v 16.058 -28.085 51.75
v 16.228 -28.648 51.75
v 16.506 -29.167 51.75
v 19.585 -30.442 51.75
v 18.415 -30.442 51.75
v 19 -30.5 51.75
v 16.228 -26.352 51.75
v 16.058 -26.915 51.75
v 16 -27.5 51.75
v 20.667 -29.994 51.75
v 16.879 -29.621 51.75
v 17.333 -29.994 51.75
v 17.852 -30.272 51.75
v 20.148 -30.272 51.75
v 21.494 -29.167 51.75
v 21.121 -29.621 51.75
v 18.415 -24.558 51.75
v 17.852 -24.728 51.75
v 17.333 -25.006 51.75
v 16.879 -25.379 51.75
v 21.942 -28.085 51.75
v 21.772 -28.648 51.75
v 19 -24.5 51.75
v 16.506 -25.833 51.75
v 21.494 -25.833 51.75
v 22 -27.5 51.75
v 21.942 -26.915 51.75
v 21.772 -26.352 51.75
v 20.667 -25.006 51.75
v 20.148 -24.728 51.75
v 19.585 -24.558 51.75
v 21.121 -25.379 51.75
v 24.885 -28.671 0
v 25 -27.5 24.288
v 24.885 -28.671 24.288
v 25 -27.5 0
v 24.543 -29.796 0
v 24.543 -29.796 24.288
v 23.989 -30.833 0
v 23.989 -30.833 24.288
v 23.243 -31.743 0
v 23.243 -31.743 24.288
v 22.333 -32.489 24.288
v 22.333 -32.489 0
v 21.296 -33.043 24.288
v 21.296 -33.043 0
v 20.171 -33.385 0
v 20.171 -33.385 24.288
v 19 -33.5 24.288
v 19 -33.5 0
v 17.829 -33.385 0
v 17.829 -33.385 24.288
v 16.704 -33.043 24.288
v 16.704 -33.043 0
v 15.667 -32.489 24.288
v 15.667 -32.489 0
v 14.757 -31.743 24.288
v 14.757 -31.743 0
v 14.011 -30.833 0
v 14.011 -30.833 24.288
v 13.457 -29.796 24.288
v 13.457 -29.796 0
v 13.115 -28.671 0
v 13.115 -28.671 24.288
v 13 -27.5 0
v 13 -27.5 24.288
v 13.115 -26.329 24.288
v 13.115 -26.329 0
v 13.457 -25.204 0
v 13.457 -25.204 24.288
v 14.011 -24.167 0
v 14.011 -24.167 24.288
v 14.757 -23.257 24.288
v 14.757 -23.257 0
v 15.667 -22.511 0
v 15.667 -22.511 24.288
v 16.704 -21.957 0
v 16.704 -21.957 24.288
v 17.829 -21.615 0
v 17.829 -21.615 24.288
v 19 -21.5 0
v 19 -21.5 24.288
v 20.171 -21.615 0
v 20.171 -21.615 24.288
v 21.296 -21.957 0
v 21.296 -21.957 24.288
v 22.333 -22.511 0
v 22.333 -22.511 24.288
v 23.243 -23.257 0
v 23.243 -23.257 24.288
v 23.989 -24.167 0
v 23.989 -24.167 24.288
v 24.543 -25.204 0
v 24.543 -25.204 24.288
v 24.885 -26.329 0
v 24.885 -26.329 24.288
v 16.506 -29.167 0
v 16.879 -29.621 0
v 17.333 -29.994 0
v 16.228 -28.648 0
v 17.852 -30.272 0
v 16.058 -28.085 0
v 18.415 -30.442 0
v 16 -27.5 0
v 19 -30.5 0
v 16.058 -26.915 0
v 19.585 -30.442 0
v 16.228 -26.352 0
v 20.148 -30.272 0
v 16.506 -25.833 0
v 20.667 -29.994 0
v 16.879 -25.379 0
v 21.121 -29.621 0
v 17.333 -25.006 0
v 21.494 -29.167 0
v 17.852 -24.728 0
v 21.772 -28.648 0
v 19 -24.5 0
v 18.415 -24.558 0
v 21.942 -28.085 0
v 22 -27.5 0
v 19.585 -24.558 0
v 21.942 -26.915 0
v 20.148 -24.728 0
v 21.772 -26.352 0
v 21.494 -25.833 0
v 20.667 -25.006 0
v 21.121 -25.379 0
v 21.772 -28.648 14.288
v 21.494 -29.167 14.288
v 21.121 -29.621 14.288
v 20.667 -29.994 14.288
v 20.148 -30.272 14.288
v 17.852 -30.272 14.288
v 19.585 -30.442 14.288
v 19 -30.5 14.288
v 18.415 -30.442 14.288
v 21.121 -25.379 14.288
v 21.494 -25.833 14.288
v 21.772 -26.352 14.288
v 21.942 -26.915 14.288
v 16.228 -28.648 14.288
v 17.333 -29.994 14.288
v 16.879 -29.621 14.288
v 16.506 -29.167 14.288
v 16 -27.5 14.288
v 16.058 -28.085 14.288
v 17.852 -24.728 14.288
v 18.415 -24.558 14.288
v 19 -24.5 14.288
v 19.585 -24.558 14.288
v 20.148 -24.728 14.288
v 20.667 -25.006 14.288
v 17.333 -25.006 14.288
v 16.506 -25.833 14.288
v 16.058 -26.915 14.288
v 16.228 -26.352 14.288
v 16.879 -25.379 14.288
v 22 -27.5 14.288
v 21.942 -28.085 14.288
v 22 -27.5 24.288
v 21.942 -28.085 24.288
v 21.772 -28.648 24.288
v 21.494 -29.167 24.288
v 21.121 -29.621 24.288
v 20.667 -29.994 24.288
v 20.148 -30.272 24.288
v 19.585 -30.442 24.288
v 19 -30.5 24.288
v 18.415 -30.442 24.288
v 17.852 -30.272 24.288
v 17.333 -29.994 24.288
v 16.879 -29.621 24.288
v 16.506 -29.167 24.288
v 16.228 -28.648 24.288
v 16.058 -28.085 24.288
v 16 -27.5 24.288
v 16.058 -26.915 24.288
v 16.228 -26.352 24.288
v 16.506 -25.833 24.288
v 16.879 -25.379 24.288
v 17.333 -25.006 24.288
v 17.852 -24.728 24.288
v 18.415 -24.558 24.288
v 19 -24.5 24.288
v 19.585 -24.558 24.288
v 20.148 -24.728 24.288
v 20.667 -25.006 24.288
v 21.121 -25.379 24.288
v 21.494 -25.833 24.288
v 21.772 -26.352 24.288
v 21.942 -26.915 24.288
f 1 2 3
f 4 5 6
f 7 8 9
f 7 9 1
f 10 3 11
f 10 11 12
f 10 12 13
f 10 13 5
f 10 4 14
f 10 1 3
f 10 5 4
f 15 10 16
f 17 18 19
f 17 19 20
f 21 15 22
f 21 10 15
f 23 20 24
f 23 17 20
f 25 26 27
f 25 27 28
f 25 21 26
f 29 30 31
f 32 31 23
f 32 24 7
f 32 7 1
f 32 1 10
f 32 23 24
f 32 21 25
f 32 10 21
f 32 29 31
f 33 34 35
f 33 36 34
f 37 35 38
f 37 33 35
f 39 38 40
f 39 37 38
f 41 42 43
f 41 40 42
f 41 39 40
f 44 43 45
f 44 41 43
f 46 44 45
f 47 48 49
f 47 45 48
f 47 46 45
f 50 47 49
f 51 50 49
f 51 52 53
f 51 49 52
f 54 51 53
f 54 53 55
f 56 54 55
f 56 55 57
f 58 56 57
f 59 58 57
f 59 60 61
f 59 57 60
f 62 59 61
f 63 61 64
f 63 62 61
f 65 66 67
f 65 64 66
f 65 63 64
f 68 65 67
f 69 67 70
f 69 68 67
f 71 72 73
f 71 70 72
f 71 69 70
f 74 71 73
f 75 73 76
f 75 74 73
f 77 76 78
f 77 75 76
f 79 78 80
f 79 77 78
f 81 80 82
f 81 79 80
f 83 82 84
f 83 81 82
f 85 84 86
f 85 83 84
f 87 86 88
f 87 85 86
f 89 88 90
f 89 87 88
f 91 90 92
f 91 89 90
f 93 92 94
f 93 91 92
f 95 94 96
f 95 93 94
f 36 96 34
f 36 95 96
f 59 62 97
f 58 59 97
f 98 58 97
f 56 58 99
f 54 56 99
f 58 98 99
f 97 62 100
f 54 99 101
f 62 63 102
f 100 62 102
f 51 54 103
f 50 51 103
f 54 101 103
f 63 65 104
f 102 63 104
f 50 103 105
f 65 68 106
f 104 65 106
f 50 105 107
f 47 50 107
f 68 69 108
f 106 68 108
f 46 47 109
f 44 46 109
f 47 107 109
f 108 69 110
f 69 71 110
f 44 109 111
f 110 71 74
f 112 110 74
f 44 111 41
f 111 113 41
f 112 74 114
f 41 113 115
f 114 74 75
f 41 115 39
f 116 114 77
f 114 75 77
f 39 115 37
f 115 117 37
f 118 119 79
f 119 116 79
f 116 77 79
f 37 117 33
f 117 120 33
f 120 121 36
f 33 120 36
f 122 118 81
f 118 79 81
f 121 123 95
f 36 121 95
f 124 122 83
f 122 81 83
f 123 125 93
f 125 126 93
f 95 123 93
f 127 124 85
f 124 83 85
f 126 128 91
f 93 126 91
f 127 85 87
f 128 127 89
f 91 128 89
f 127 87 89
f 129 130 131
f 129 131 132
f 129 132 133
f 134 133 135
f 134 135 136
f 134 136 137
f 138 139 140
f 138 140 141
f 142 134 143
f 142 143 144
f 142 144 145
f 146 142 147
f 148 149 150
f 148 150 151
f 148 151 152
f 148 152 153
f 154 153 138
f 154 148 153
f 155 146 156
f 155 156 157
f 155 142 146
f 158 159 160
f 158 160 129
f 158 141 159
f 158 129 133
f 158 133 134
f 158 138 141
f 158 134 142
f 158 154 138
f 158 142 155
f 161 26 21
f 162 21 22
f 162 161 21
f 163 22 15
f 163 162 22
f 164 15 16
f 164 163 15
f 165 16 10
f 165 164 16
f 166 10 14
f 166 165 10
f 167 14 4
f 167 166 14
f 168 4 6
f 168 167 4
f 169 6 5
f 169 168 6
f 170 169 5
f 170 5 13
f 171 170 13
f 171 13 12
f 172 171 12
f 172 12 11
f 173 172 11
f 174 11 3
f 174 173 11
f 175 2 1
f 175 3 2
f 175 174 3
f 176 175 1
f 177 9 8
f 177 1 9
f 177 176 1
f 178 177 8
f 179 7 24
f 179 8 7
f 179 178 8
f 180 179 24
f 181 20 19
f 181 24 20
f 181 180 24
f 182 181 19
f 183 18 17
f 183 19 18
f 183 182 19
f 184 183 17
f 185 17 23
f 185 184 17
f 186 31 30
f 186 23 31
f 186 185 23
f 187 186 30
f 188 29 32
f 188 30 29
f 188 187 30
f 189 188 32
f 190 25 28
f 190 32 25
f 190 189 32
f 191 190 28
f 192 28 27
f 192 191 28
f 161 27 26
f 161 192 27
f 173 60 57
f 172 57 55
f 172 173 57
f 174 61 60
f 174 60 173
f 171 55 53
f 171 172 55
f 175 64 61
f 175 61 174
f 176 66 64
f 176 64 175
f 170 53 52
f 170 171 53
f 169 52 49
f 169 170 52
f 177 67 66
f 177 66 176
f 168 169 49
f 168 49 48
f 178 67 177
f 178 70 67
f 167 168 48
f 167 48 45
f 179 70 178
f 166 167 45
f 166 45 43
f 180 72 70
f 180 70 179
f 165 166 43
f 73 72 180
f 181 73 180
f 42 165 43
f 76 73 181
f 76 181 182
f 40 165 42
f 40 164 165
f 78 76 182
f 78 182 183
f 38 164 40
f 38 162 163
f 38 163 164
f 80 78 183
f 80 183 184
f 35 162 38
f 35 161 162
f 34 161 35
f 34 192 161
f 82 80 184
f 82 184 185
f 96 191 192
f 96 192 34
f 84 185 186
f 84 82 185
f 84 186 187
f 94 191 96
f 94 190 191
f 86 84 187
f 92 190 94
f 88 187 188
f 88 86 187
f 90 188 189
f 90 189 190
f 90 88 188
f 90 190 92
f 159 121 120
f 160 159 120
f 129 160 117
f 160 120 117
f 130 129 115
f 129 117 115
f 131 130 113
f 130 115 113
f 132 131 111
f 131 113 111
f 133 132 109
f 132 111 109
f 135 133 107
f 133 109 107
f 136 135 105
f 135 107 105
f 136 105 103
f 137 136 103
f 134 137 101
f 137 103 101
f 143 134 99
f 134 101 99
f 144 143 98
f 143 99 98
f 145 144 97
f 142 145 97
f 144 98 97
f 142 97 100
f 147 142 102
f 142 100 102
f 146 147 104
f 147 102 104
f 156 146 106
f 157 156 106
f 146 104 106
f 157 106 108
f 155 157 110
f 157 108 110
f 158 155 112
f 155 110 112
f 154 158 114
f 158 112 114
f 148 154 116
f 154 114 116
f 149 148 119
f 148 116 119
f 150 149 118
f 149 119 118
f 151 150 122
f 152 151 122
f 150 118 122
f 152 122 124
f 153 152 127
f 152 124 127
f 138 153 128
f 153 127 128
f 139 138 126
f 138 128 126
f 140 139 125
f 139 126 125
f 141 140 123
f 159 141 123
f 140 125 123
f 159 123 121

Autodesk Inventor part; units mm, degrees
ref_plane "YZ Plane" through (0, 0, 0) normal (1, 0, 0) x (0, 1, 0)
ref_plane "XZ Plane" through (0, 0, 0) normal (0, 1, 0) x (-1, 0, 0)
ref_plane "XY Plane" through (0, 0, 0) normal (0, 0, 1) x (1, 0, 0)
sketch "Sketch1" plane through (0, 0, 0) normal (0, 0, 1) x (1, 0, 0)
  circle A0 centre (19, -27.5) radius 3 projected
  circle A1 centre (19, -27.5) radius 6
  point P0 (0, 0)
  dimension "d0" = 12
extrude "Extrusion1" add sketch "Sketch1" along normal blind 24.2875
sketch "Sketch2" plane through (19, -27.5, 24.2875) normal (0, 0, 1) x (1, 0, 0)
  circle A0 centre (0, 0) radius 3
  point P0 (-19, 27.5)
  dimension "d3" = 6
extrude "Extrusion2" add sketch "Sketch2" along normal blind 27.4625
sketch "Sketch3" plane through (19, -27.5, 24.2875) normal (0, 0, -1) x (-1, 0, 0)
  circle A0 centre (0, 0) radius 3
  point P0 (19, 27.5)
extrude "Extrusion3" add sketch "Sketch3" along normal blind 10
properties part number "fuckup fixer"
